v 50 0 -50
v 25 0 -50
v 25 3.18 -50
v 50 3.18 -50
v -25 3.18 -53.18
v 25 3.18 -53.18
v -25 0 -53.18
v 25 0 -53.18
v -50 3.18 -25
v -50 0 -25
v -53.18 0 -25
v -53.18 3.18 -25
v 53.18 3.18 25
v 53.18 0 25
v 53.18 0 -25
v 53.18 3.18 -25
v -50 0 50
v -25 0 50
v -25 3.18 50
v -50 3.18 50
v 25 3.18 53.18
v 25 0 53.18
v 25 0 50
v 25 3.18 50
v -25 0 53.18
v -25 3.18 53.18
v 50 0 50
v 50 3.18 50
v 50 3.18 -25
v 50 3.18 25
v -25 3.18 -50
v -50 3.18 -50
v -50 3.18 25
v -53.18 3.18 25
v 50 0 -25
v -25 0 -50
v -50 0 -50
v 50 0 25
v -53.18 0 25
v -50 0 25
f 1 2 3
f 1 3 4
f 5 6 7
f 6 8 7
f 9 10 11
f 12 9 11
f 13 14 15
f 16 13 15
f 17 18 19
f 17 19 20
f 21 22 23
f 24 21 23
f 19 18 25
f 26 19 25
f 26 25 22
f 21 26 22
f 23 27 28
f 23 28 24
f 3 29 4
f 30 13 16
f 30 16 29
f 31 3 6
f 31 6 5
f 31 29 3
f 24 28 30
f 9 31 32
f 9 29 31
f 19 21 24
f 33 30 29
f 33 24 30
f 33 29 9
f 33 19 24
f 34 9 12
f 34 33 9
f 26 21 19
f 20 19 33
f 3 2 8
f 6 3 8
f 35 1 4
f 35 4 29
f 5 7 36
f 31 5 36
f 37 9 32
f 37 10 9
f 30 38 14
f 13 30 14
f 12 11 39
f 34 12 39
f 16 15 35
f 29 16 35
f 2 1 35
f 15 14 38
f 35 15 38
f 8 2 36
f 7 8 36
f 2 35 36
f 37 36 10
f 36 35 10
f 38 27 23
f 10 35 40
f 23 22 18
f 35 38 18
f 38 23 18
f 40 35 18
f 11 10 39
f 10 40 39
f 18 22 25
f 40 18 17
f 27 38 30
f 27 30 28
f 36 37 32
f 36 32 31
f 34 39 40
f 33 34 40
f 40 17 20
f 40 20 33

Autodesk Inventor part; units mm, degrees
ref_plane "YZ Plane" through (0, 0, 0) normal (1, 0, 0) x (0, 1, 0)
ref_plane "XZ Plane" through (0, 0, 0) normal (0, 1, 0) x (-1, 0, 0)
ref_plane "XY Plane" through (0, 0, 0) normal (0, 0, 1) x (1, 0, 0)
sketch "Boceto1" plane through (0, 0, 0) normal (0, 1, 0) x (-1, 0, 0)
  line L0 (-50, 50) -> (50, 50)
  line L1 (50, 50) -> (50, -50)
  line L2 (50, -50) -> (-50, -50)
  line L3 (-50, -50) -> (-50, 50)
  line L4 (-50, 50) -> (50, -50) construction
  line L5 (50, 50) -> (-50, -50) construction
  line L6 (25, 53.18) -> (-25, 53.18)
  line L7 (-25, 53.18) -> (-25, 50)
  line L8 (-25, 50) -> (25, 50)
  line L9 (25, 50) -> (25, 53.18)
  line L10 (25, -50) -> (-25, -50)
  line L11 (-25, -50) -> (-25, -53.18)
  line L12 (-25, -53.18) -> (25, -53.18)
  line L13 (25, -53.18) -> (25, -50)
  line L14 (53.18, 25) -> (50, 25)
  line L15 (50, 25) -> (50, -25)
  line L16 (50, -25) -> (53.18, -25)
  line L17 (53.18, -25) -> (53.18, 25)
  line L18 (-50, 25) -> (-53.18, 25)
  line L19 (-53.18, 25) -> (-53.18, -25)
  line L20 (-53.18, -25) -> (-50, -25)
  line L21 (-50, -25) -> (-50, 25)
  point P0 (0, 0)
  dimension "d0" = 100
  dimension "d1" = 100
  dimension "d2" = 3.18
  dimension "d3" = 3.18
  dimension "d4" = 50
  dimension "d5" = 25
  dimension "d6" = 25
  dimension "d7" = 25
extrude "Extrusión1" add sketch "Boceto1" along normal blind 3.18
properties part number "BASE_FONDO"
